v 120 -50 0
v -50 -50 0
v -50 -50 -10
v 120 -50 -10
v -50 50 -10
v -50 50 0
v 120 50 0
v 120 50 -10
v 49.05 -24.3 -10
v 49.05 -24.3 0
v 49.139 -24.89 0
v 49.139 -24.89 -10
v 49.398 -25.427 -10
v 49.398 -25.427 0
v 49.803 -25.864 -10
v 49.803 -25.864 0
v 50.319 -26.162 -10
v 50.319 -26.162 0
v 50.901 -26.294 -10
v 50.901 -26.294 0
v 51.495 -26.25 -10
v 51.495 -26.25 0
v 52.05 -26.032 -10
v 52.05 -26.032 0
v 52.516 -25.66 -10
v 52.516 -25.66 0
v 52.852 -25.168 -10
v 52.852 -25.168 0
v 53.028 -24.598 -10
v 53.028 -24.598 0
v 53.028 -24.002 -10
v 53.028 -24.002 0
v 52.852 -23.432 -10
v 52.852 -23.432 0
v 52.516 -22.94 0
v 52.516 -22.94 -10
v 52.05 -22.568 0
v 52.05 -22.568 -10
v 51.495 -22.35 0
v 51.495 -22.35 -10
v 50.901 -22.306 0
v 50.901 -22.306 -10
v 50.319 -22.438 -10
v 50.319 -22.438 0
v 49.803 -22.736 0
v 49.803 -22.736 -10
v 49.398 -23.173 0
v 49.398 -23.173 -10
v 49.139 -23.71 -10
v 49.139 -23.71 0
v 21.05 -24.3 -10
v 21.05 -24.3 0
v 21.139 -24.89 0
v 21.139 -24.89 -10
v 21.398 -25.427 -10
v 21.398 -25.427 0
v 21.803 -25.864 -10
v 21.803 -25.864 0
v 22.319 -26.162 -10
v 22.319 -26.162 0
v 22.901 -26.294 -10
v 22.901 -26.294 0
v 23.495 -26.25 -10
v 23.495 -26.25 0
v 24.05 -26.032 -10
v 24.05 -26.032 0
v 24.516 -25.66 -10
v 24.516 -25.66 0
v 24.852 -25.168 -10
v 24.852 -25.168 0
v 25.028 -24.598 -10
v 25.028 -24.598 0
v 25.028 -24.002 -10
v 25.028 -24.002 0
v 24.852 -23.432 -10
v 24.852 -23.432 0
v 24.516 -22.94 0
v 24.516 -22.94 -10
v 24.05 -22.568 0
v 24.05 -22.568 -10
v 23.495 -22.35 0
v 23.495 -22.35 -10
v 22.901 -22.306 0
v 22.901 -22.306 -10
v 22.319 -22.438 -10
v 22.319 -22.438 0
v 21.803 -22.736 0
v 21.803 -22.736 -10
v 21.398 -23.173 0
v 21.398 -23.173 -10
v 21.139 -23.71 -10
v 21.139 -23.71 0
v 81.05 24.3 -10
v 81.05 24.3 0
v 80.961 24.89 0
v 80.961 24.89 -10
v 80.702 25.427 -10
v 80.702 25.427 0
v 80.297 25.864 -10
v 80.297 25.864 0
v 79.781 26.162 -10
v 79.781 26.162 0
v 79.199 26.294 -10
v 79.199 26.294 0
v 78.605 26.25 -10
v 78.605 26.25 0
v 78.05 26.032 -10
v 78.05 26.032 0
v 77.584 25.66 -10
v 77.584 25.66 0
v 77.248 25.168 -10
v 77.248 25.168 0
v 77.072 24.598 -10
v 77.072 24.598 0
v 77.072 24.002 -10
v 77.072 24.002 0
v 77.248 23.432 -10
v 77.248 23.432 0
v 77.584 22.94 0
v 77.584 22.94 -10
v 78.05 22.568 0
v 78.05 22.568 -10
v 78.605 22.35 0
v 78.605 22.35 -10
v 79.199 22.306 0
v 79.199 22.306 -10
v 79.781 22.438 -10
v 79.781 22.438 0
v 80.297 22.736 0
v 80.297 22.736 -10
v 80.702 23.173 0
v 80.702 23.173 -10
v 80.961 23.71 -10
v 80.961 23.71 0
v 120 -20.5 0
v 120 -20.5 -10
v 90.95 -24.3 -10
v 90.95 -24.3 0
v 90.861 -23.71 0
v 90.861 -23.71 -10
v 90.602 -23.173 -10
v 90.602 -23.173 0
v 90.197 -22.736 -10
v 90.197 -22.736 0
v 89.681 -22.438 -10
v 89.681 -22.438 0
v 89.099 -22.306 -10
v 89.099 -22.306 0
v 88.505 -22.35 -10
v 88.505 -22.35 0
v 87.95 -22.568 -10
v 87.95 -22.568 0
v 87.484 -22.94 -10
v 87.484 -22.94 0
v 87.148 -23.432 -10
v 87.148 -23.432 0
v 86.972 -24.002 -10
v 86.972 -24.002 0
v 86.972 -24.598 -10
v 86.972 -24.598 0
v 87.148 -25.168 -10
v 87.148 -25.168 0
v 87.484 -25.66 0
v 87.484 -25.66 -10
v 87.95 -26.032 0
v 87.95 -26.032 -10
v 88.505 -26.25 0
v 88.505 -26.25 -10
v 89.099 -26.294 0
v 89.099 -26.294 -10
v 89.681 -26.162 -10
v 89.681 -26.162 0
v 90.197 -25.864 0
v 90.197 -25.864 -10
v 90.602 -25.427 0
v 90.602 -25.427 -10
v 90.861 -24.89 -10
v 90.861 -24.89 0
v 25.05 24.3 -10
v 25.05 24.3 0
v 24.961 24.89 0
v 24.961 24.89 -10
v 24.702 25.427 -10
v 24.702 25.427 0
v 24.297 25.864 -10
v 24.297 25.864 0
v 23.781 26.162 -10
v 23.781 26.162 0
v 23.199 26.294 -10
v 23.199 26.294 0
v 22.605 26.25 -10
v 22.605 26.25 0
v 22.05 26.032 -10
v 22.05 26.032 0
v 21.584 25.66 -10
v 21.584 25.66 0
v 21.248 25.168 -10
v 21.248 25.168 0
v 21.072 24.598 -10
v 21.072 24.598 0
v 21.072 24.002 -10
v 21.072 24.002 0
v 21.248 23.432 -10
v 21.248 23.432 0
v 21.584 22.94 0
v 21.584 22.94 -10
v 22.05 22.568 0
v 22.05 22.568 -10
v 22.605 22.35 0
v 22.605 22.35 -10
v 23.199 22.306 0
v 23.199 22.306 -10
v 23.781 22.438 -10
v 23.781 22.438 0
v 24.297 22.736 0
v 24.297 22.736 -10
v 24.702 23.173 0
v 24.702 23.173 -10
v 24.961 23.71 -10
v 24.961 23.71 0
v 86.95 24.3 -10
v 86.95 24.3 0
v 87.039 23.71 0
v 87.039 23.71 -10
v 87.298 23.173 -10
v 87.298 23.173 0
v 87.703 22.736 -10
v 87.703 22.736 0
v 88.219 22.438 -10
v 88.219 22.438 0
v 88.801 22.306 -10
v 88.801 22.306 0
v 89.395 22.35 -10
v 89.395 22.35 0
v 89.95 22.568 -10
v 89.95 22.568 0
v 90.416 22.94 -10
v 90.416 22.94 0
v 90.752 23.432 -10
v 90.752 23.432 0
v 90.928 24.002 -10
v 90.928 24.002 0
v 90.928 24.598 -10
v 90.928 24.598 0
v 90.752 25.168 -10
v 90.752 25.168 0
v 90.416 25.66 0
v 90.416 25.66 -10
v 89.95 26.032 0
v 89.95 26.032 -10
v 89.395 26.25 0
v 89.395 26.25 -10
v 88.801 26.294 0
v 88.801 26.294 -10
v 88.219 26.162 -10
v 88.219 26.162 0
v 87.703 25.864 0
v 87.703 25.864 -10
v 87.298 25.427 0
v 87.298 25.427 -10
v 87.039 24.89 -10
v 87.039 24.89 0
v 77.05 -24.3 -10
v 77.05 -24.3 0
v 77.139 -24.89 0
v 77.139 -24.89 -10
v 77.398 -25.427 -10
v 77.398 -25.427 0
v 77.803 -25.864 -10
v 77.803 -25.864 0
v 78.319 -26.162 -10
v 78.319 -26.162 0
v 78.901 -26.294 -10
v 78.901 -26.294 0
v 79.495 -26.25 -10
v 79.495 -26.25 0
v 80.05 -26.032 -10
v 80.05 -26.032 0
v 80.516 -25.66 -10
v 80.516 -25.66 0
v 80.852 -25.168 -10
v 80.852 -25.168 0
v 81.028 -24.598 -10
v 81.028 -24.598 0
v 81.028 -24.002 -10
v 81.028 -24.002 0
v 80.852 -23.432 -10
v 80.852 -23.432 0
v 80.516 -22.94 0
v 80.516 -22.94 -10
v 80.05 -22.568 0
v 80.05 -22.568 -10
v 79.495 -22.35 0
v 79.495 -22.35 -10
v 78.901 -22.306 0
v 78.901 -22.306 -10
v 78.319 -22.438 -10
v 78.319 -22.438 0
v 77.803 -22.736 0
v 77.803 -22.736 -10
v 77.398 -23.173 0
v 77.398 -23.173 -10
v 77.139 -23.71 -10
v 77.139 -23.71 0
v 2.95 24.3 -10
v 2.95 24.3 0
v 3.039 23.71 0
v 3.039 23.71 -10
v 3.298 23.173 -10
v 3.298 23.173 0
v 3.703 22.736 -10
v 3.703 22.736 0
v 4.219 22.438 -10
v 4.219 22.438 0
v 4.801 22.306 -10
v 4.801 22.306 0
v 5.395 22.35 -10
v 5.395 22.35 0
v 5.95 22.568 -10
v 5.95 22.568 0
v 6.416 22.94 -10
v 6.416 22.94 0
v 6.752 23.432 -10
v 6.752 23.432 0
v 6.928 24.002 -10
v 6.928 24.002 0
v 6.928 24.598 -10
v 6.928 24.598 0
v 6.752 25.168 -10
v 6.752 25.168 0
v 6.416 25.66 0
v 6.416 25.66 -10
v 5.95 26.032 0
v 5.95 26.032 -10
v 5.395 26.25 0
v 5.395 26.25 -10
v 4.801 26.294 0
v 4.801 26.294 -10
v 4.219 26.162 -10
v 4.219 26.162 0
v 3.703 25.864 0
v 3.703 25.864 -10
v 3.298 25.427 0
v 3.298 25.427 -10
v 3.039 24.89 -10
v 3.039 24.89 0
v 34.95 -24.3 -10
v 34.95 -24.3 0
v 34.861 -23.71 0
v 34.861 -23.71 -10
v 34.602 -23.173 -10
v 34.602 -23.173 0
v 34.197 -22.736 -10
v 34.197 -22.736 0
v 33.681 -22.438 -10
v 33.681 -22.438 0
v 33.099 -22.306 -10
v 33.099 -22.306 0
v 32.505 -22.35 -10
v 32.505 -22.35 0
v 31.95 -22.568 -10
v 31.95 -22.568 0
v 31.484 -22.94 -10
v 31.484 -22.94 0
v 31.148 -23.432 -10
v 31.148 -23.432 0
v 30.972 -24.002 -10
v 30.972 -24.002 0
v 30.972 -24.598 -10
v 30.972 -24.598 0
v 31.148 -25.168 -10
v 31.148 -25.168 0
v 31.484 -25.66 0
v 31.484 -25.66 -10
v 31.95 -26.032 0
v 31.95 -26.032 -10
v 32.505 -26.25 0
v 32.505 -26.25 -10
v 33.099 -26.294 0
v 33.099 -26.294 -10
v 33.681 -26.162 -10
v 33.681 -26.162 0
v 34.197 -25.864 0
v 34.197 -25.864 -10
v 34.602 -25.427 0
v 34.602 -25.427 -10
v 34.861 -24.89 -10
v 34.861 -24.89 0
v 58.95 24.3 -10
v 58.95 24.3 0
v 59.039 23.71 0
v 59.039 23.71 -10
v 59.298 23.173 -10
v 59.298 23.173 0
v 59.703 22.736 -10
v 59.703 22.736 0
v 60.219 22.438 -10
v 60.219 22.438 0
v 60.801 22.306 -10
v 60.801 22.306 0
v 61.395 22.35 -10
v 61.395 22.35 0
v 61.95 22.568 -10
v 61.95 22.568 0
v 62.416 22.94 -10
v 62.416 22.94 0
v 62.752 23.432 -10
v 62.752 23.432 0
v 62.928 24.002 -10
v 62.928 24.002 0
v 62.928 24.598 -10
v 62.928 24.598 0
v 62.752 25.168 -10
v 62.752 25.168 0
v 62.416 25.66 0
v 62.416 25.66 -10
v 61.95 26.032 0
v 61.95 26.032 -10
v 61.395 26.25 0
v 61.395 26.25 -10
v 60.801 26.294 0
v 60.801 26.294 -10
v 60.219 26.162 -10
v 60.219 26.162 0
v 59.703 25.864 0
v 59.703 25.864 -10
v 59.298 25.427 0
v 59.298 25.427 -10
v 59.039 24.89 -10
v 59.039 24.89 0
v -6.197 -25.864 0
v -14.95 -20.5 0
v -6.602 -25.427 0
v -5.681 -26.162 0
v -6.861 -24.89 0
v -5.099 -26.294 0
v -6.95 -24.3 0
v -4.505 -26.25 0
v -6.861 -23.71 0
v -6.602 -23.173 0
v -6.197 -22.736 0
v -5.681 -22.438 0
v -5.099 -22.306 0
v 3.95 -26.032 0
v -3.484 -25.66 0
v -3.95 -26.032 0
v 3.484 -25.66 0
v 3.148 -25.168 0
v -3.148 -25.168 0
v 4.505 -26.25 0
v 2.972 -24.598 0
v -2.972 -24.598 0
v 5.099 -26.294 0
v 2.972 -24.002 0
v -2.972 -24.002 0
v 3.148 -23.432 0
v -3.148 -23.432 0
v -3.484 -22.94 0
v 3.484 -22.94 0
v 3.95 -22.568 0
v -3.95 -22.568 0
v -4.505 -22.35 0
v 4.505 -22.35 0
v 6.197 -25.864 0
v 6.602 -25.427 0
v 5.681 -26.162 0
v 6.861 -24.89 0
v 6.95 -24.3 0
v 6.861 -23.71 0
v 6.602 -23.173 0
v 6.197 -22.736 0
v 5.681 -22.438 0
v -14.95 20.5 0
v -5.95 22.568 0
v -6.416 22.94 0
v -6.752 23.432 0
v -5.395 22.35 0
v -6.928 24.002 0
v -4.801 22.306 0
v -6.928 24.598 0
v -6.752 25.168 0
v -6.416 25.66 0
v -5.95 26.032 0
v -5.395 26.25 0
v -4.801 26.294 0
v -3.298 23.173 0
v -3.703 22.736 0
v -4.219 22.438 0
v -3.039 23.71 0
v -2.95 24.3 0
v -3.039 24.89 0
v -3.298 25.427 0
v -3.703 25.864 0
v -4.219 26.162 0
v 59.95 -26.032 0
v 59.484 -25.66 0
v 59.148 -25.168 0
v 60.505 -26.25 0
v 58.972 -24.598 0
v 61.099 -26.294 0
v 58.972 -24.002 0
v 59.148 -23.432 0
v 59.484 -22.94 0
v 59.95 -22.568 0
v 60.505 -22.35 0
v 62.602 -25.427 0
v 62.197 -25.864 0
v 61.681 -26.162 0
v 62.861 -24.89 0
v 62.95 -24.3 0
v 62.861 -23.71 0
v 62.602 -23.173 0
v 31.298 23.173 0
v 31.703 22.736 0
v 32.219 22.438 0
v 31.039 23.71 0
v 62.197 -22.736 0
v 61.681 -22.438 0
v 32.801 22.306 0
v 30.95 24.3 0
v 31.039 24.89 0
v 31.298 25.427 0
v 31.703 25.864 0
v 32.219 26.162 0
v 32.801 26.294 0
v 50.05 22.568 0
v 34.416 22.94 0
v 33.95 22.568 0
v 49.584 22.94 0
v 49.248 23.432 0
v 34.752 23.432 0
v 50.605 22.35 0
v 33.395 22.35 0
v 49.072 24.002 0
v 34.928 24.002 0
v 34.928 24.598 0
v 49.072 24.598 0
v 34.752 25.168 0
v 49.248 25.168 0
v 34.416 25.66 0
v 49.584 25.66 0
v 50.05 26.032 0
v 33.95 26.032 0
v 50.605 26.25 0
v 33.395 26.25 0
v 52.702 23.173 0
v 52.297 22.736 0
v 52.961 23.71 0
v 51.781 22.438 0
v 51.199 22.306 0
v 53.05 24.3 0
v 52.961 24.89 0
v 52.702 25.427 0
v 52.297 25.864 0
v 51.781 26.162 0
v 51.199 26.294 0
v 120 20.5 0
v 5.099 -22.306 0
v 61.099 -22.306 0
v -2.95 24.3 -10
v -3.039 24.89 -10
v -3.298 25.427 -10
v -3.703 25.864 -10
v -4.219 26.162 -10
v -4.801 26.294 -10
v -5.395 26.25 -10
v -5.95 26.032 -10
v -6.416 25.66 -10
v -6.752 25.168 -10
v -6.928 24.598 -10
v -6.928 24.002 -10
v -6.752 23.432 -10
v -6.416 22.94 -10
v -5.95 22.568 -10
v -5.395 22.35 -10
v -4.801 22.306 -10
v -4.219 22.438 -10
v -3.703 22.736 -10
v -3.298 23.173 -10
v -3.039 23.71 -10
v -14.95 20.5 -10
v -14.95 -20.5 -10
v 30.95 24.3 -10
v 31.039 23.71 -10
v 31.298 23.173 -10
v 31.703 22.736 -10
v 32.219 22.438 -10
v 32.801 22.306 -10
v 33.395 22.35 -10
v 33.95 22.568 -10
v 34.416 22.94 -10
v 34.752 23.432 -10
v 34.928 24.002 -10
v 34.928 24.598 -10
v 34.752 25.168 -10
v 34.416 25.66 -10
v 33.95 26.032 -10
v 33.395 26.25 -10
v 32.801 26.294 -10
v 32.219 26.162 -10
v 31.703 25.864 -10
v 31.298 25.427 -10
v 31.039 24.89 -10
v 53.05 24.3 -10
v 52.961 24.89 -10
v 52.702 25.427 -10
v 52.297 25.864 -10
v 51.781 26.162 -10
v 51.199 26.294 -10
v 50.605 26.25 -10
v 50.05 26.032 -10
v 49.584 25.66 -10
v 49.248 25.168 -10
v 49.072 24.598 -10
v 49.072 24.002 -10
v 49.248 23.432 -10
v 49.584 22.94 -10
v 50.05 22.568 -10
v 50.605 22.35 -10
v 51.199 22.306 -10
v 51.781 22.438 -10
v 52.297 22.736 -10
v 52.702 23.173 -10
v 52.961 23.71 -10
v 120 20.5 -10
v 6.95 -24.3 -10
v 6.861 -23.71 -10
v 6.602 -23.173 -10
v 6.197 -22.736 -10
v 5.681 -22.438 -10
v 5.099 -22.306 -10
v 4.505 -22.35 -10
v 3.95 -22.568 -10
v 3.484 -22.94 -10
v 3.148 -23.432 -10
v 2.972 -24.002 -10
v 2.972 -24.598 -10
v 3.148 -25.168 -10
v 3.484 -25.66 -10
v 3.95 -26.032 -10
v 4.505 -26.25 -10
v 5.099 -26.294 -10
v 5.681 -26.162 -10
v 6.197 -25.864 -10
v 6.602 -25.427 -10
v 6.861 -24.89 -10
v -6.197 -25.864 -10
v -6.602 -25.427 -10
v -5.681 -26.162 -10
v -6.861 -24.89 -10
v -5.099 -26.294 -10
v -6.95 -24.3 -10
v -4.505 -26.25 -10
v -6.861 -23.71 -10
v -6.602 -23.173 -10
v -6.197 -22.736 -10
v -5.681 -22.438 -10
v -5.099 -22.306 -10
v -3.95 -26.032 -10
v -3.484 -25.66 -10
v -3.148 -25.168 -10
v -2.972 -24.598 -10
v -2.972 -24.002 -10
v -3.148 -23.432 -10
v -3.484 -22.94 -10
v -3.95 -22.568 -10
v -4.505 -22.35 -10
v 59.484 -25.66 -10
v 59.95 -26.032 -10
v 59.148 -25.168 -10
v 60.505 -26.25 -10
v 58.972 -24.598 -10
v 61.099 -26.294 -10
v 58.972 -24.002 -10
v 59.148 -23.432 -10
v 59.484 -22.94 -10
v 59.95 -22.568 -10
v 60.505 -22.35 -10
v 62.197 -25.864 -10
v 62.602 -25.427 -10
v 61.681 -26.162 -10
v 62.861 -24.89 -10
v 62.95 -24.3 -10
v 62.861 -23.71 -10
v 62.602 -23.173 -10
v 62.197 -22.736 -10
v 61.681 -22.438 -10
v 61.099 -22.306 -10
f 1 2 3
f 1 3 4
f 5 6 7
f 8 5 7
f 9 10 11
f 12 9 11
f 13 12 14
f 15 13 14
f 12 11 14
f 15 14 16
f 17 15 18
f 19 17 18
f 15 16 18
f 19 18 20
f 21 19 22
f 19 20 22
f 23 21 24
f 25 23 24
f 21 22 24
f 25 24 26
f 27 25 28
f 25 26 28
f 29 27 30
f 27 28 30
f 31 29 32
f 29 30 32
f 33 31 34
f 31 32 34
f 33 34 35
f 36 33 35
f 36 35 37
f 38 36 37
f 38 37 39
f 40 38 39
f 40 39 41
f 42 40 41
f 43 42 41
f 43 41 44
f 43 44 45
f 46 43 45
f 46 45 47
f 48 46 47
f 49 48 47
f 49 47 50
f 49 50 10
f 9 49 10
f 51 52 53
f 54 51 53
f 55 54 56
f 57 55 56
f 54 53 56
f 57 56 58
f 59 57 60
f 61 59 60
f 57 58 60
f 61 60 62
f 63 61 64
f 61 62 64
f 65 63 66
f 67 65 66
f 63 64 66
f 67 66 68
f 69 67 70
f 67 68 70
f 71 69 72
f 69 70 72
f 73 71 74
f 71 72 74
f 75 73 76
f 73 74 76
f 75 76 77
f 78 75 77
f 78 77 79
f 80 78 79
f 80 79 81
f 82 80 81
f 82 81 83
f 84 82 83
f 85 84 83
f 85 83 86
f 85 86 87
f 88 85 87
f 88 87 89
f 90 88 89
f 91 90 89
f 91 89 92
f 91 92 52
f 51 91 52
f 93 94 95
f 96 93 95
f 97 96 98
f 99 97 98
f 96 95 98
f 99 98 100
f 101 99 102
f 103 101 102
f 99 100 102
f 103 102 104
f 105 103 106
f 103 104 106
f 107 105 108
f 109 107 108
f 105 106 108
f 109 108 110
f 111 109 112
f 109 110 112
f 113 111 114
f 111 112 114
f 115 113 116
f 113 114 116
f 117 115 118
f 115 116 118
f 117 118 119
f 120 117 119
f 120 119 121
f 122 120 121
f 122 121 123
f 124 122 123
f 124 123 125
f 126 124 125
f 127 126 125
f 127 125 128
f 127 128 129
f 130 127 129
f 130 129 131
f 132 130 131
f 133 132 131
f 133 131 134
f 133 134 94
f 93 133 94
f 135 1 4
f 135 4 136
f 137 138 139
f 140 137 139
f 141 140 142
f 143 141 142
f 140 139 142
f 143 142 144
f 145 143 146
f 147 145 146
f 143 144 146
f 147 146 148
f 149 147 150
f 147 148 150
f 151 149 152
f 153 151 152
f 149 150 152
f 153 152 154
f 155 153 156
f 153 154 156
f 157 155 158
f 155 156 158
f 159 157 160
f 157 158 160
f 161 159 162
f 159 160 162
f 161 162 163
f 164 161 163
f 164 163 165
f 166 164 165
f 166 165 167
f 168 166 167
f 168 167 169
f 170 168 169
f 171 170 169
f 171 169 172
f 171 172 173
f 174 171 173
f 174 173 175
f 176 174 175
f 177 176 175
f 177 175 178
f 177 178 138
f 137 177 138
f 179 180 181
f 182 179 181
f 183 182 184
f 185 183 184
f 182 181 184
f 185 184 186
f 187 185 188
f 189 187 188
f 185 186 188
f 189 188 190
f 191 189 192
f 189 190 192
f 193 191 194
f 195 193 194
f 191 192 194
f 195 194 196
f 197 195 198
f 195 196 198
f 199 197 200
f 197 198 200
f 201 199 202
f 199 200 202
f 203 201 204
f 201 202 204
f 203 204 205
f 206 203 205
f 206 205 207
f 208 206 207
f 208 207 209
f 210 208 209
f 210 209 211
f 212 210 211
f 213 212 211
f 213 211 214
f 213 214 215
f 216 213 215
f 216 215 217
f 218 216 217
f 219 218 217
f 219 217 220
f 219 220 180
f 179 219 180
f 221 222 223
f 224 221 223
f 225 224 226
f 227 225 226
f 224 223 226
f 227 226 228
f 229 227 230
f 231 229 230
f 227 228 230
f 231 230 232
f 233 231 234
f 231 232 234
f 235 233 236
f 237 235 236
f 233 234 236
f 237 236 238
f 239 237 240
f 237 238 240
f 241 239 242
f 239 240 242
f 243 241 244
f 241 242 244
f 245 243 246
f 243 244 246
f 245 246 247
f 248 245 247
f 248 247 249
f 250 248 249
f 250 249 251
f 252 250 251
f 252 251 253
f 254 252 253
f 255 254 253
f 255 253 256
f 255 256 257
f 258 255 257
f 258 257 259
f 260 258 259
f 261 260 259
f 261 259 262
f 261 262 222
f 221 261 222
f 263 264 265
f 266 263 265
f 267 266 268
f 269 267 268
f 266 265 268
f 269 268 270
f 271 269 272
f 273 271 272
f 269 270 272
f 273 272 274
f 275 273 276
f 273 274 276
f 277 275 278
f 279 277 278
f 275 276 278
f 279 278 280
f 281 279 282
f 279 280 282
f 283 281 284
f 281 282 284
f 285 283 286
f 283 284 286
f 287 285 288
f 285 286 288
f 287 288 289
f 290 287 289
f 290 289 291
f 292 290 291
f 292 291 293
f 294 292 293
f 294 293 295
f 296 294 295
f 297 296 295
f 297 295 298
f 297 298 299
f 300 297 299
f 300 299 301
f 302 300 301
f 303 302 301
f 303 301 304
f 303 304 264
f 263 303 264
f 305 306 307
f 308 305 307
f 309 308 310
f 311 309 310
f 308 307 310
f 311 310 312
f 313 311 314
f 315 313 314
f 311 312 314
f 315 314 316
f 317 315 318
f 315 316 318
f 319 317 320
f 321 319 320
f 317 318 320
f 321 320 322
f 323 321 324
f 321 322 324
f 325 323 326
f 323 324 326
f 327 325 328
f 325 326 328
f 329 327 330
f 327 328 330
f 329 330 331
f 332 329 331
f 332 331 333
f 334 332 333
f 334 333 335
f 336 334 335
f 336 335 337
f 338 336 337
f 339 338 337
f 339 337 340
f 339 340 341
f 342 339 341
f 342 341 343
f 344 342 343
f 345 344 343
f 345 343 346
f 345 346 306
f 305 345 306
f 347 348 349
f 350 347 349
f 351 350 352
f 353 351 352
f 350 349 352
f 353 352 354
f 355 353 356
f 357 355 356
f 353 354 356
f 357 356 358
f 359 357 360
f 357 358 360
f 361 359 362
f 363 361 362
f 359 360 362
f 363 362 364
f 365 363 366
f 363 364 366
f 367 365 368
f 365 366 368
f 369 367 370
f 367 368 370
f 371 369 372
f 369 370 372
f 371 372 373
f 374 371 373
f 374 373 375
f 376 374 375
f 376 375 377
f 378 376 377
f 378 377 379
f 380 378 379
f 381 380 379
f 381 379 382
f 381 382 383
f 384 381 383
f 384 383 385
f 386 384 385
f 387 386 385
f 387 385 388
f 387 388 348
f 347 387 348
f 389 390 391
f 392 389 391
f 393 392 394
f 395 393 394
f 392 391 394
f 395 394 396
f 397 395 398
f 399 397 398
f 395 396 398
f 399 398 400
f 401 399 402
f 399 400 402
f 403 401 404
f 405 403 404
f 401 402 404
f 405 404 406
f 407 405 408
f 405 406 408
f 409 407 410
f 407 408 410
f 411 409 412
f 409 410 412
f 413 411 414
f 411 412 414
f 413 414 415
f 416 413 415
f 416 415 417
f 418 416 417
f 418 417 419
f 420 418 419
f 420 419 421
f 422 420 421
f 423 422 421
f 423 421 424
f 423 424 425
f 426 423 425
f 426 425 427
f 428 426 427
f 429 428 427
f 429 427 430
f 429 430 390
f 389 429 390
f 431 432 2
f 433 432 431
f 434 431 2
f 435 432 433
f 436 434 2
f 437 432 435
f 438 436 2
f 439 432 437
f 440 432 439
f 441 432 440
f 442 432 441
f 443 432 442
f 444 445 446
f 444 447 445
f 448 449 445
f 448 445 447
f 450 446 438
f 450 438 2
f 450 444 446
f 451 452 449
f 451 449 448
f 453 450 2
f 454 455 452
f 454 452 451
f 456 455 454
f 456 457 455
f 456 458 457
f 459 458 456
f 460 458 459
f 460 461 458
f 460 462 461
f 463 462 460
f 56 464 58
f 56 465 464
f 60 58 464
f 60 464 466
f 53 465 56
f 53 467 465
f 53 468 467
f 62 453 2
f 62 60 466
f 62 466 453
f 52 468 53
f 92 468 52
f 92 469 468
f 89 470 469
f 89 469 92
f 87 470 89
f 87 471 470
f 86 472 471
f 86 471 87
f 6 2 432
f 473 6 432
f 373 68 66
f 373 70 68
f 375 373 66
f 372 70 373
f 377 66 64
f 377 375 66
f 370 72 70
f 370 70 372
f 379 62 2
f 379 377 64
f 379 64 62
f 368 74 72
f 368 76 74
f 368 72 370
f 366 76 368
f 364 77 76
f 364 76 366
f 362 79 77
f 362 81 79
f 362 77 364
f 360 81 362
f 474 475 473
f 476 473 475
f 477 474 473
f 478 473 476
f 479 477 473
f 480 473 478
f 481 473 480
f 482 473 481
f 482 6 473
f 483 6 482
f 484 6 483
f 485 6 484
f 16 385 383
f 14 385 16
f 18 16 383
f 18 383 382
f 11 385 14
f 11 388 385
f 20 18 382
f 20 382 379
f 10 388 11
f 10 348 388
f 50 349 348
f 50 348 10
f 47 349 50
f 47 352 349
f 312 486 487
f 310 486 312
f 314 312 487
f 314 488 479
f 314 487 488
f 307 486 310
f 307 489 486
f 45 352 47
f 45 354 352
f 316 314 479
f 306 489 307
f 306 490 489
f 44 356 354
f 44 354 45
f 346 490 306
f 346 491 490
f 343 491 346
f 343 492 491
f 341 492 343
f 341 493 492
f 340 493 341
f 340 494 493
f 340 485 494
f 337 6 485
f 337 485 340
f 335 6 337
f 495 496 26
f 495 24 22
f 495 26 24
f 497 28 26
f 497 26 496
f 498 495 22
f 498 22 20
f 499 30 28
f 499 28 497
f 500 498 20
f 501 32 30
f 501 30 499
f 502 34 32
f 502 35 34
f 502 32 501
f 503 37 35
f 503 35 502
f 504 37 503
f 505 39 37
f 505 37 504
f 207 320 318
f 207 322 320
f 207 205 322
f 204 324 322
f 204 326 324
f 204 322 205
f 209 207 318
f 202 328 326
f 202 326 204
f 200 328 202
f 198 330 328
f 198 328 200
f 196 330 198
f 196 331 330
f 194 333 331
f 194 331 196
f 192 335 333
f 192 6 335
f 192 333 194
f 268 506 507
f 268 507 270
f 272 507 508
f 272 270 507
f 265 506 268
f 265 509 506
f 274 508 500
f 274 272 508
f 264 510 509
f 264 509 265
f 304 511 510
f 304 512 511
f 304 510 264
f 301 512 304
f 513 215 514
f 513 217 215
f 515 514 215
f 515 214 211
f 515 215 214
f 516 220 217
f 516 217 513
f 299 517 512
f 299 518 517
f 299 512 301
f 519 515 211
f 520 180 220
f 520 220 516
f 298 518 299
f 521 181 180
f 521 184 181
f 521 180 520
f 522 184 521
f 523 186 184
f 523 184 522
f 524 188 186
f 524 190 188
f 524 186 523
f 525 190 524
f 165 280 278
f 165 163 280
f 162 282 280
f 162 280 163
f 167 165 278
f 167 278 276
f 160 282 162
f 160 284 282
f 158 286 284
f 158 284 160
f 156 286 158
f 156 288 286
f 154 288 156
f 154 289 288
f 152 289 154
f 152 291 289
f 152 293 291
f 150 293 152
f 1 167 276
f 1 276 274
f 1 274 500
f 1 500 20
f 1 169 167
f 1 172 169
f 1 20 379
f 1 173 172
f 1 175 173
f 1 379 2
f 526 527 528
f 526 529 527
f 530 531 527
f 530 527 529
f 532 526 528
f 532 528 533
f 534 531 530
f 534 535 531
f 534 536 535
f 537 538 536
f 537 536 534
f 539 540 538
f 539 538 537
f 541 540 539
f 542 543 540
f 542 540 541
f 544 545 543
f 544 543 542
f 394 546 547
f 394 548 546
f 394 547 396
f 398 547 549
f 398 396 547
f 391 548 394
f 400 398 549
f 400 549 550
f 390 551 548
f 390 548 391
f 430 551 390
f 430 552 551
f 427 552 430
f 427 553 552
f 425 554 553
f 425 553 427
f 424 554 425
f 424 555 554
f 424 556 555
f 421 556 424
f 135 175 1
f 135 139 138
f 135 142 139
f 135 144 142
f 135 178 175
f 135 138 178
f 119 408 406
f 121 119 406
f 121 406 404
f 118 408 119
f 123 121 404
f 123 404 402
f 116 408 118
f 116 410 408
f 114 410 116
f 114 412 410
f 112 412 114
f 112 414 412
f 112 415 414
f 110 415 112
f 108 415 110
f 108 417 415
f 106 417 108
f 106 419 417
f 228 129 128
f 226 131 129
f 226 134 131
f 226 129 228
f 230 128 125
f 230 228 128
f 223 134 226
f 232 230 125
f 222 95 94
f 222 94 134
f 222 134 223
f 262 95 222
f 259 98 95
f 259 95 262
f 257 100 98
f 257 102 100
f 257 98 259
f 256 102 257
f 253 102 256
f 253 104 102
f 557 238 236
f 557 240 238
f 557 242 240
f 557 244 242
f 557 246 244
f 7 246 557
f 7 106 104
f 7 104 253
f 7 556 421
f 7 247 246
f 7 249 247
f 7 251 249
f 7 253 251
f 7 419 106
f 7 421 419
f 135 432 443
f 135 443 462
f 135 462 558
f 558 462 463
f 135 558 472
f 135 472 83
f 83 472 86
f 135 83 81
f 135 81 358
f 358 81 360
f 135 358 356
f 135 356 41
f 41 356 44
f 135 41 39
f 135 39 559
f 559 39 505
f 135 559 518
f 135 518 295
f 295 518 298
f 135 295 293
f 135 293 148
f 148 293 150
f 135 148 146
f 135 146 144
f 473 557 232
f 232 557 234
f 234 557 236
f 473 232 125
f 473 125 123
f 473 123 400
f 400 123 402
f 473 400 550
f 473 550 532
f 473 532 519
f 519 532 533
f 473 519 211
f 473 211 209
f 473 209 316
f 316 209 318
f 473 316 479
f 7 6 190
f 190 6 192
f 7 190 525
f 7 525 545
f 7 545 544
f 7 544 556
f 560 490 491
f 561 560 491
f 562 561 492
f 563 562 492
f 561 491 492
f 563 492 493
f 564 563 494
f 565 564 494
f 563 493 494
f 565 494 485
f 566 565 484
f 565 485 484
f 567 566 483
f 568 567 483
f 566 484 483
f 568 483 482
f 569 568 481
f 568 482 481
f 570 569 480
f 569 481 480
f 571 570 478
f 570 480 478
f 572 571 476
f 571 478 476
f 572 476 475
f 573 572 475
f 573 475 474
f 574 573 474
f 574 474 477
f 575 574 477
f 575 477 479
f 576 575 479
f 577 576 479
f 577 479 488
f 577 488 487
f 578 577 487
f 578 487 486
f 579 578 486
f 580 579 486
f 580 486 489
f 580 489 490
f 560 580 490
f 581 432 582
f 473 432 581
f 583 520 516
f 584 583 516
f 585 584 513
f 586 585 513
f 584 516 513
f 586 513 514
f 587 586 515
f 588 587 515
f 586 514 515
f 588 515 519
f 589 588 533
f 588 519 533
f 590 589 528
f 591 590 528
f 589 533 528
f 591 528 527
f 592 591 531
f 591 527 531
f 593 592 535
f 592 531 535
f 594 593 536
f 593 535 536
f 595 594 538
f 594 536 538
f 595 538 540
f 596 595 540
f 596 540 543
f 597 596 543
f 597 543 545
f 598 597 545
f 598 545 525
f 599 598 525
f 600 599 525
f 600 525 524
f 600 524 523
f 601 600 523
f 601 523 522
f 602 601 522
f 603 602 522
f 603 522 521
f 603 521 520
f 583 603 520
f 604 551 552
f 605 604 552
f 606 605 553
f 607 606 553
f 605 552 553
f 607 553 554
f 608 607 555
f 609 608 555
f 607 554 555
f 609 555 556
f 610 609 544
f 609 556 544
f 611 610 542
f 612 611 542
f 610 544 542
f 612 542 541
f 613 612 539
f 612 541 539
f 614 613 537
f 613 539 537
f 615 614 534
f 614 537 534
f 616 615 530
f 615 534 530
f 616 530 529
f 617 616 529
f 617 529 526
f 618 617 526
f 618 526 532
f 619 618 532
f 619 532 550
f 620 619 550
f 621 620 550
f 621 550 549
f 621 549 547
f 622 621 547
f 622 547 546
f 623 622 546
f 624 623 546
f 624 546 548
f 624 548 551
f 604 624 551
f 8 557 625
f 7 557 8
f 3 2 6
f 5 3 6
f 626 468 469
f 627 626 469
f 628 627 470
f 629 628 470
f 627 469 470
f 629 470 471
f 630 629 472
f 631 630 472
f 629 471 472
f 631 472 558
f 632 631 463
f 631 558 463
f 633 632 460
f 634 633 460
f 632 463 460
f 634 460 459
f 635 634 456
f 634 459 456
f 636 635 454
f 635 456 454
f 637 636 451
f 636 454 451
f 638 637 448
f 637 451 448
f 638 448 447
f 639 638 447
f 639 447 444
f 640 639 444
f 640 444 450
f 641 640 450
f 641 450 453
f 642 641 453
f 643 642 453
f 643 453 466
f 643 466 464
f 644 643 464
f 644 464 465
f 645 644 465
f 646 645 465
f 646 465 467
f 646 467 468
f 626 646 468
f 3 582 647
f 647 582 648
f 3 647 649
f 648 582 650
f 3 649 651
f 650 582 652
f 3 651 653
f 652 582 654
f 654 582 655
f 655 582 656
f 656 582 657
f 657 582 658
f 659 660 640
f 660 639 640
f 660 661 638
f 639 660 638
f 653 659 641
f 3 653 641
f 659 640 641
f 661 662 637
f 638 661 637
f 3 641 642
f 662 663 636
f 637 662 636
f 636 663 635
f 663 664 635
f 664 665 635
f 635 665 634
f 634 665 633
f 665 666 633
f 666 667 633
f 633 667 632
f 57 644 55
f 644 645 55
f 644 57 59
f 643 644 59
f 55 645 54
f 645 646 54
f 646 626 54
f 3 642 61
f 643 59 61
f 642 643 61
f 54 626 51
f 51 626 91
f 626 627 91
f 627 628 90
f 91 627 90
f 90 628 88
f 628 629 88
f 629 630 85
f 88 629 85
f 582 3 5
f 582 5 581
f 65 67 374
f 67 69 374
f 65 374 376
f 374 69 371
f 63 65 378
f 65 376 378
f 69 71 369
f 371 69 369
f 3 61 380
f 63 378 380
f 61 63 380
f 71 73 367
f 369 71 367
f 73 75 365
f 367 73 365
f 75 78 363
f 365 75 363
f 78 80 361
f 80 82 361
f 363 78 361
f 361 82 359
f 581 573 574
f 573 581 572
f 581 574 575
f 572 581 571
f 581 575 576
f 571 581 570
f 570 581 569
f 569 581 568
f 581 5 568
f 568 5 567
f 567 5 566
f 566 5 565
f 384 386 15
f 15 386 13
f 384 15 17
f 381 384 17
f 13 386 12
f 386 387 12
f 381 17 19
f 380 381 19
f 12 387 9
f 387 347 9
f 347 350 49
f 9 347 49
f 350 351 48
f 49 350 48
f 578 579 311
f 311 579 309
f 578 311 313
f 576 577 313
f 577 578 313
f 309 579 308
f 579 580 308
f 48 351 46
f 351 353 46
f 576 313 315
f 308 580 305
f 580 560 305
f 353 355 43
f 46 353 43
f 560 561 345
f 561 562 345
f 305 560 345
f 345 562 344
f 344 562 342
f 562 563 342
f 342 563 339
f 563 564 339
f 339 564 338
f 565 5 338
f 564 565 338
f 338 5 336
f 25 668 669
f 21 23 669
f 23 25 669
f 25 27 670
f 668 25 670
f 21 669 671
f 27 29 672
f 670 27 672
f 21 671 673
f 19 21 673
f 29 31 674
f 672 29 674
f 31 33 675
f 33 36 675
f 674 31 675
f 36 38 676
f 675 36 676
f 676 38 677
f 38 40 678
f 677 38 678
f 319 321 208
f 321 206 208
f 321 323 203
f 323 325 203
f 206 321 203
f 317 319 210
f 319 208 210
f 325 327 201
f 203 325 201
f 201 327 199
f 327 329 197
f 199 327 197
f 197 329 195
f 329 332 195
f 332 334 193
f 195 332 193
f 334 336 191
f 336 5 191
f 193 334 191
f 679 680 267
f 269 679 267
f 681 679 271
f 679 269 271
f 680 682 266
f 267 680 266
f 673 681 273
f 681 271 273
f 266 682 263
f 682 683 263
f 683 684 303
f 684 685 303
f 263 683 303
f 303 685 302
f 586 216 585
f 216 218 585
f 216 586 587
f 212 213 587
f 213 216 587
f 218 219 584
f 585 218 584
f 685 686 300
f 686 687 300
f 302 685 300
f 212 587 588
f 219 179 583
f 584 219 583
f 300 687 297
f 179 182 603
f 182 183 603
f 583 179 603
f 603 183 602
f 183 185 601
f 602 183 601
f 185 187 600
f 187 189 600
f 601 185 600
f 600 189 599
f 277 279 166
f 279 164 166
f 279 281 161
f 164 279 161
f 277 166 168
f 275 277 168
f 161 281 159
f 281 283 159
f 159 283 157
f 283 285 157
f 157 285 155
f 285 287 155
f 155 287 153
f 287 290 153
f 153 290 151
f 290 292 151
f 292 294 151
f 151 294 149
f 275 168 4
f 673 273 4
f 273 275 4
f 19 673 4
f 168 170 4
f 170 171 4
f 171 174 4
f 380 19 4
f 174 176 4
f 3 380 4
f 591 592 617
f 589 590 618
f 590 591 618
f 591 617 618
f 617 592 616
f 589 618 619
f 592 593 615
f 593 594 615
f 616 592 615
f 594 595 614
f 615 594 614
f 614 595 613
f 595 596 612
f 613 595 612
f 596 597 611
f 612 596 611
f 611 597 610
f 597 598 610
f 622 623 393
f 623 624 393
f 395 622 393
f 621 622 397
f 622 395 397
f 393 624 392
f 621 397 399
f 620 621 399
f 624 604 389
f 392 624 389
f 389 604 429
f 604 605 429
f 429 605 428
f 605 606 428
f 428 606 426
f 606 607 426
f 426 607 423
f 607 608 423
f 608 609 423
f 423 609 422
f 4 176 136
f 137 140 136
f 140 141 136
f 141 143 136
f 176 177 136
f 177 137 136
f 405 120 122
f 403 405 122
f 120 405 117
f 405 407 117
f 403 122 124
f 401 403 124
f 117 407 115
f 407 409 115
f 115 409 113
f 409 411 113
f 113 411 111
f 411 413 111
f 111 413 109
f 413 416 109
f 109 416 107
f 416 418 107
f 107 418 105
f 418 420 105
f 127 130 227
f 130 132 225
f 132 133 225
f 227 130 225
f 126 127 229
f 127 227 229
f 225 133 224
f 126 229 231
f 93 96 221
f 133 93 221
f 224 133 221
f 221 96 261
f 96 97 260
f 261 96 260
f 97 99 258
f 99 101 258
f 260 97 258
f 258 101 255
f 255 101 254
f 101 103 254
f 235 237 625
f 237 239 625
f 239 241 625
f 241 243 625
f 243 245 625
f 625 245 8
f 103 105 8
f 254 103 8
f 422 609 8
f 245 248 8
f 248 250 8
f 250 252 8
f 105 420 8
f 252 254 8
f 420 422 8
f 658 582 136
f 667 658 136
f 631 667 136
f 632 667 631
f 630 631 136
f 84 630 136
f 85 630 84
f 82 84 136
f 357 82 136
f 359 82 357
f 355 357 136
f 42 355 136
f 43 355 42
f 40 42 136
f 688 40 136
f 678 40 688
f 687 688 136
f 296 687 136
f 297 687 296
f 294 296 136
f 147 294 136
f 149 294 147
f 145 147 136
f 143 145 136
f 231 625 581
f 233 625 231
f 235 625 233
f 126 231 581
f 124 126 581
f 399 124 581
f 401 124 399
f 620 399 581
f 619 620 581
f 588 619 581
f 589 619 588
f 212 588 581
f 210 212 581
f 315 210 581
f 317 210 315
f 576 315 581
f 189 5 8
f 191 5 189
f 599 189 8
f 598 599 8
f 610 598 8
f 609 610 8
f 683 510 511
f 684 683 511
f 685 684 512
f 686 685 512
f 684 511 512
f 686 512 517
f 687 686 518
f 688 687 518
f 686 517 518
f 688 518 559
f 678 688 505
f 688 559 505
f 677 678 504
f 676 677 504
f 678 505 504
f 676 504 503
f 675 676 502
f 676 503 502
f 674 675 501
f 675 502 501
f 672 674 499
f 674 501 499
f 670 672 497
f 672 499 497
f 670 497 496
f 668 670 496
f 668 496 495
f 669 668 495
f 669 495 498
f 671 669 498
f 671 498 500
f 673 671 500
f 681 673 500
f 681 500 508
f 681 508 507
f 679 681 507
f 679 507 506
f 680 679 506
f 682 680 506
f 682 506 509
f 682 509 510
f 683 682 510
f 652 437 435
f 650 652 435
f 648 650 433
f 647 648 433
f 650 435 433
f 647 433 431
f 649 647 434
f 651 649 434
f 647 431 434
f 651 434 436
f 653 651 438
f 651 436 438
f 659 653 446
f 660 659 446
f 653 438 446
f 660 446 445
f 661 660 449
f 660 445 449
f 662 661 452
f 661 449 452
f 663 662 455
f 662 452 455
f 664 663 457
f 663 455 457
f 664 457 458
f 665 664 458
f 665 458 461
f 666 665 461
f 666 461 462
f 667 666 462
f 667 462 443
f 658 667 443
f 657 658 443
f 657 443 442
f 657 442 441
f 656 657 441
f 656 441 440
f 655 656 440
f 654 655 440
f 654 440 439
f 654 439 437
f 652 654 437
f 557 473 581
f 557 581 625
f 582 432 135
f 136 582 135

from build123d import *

# Parameters (mm, degrees)
SKETCH7_W           = 170
SKETCH7_H           = 100
BOSS_EXTRUDE1_DEPTH = 10
SKETCH1_R           = 2
CUT_EXTRUDE2_DEPTH  = 131.384048104
LPATTERN1_COUNT     = 4
LPATTERN1_PITCH     = 28
SKETCH8_W           = 134.95
SKETCH8_H           = 41
CUT_EXTRUDE3_DEPTH  = 131.384048104


with BuildPart() as part:
    # Sketch7 → Boss-Extrude1 (new body)
    with BuildSketch(Plane.XY):
        with Locations((35, 0)):
            Rectangle(SKETCH7_W, SKETCH7_H)
    extrude(amount=-BOSS_EXTRUDE1_DEPTH)

    # Sketch1 → Cut-Extrude2 (cut, through all)
    with BuildSketch(Plane.XY):
        with Locations((4.95, -24.3)):
            Circle(SKETCH1_R)
        with Locations(Location((-4.95, -24.3, 0), (0, 0, 180))):
            Circle(SKETCH1_R)
        with Locations((-4.95, 24.3)):
            Circle(SKETCH1_R)
        with Locations(Location((4.95, 24.3, 0), (0, 0, 180))):
            Circle(SKETCH1_R)
    cut_extrude2 = extrude(amount=-CUT_EXTRUDE2_DEPTH, mode=Mode.SUBTRACT)

    # LPattern1: Cut-Extrude2 ×4
    with Locations(*[(i * LPATTERN1_PITCH, 0, 0) for i in range(1, LPATTERN1_COUNT)]):
        add(cut_extrude2, mode=Mode.SUBTRACT)

    # Sketch8 → Cut-Extrude3 (cut, through all)
    with BuildSketch(Plane.XY):
        with Locations((52.525, 0)):
            Rectangle(SKETCH8_W, SKETCH8_H)
    extrude(amount=-CUT_EXTRUDE3_DEPTH, mode=Mode.SUBTRACT)


solid = part.part
